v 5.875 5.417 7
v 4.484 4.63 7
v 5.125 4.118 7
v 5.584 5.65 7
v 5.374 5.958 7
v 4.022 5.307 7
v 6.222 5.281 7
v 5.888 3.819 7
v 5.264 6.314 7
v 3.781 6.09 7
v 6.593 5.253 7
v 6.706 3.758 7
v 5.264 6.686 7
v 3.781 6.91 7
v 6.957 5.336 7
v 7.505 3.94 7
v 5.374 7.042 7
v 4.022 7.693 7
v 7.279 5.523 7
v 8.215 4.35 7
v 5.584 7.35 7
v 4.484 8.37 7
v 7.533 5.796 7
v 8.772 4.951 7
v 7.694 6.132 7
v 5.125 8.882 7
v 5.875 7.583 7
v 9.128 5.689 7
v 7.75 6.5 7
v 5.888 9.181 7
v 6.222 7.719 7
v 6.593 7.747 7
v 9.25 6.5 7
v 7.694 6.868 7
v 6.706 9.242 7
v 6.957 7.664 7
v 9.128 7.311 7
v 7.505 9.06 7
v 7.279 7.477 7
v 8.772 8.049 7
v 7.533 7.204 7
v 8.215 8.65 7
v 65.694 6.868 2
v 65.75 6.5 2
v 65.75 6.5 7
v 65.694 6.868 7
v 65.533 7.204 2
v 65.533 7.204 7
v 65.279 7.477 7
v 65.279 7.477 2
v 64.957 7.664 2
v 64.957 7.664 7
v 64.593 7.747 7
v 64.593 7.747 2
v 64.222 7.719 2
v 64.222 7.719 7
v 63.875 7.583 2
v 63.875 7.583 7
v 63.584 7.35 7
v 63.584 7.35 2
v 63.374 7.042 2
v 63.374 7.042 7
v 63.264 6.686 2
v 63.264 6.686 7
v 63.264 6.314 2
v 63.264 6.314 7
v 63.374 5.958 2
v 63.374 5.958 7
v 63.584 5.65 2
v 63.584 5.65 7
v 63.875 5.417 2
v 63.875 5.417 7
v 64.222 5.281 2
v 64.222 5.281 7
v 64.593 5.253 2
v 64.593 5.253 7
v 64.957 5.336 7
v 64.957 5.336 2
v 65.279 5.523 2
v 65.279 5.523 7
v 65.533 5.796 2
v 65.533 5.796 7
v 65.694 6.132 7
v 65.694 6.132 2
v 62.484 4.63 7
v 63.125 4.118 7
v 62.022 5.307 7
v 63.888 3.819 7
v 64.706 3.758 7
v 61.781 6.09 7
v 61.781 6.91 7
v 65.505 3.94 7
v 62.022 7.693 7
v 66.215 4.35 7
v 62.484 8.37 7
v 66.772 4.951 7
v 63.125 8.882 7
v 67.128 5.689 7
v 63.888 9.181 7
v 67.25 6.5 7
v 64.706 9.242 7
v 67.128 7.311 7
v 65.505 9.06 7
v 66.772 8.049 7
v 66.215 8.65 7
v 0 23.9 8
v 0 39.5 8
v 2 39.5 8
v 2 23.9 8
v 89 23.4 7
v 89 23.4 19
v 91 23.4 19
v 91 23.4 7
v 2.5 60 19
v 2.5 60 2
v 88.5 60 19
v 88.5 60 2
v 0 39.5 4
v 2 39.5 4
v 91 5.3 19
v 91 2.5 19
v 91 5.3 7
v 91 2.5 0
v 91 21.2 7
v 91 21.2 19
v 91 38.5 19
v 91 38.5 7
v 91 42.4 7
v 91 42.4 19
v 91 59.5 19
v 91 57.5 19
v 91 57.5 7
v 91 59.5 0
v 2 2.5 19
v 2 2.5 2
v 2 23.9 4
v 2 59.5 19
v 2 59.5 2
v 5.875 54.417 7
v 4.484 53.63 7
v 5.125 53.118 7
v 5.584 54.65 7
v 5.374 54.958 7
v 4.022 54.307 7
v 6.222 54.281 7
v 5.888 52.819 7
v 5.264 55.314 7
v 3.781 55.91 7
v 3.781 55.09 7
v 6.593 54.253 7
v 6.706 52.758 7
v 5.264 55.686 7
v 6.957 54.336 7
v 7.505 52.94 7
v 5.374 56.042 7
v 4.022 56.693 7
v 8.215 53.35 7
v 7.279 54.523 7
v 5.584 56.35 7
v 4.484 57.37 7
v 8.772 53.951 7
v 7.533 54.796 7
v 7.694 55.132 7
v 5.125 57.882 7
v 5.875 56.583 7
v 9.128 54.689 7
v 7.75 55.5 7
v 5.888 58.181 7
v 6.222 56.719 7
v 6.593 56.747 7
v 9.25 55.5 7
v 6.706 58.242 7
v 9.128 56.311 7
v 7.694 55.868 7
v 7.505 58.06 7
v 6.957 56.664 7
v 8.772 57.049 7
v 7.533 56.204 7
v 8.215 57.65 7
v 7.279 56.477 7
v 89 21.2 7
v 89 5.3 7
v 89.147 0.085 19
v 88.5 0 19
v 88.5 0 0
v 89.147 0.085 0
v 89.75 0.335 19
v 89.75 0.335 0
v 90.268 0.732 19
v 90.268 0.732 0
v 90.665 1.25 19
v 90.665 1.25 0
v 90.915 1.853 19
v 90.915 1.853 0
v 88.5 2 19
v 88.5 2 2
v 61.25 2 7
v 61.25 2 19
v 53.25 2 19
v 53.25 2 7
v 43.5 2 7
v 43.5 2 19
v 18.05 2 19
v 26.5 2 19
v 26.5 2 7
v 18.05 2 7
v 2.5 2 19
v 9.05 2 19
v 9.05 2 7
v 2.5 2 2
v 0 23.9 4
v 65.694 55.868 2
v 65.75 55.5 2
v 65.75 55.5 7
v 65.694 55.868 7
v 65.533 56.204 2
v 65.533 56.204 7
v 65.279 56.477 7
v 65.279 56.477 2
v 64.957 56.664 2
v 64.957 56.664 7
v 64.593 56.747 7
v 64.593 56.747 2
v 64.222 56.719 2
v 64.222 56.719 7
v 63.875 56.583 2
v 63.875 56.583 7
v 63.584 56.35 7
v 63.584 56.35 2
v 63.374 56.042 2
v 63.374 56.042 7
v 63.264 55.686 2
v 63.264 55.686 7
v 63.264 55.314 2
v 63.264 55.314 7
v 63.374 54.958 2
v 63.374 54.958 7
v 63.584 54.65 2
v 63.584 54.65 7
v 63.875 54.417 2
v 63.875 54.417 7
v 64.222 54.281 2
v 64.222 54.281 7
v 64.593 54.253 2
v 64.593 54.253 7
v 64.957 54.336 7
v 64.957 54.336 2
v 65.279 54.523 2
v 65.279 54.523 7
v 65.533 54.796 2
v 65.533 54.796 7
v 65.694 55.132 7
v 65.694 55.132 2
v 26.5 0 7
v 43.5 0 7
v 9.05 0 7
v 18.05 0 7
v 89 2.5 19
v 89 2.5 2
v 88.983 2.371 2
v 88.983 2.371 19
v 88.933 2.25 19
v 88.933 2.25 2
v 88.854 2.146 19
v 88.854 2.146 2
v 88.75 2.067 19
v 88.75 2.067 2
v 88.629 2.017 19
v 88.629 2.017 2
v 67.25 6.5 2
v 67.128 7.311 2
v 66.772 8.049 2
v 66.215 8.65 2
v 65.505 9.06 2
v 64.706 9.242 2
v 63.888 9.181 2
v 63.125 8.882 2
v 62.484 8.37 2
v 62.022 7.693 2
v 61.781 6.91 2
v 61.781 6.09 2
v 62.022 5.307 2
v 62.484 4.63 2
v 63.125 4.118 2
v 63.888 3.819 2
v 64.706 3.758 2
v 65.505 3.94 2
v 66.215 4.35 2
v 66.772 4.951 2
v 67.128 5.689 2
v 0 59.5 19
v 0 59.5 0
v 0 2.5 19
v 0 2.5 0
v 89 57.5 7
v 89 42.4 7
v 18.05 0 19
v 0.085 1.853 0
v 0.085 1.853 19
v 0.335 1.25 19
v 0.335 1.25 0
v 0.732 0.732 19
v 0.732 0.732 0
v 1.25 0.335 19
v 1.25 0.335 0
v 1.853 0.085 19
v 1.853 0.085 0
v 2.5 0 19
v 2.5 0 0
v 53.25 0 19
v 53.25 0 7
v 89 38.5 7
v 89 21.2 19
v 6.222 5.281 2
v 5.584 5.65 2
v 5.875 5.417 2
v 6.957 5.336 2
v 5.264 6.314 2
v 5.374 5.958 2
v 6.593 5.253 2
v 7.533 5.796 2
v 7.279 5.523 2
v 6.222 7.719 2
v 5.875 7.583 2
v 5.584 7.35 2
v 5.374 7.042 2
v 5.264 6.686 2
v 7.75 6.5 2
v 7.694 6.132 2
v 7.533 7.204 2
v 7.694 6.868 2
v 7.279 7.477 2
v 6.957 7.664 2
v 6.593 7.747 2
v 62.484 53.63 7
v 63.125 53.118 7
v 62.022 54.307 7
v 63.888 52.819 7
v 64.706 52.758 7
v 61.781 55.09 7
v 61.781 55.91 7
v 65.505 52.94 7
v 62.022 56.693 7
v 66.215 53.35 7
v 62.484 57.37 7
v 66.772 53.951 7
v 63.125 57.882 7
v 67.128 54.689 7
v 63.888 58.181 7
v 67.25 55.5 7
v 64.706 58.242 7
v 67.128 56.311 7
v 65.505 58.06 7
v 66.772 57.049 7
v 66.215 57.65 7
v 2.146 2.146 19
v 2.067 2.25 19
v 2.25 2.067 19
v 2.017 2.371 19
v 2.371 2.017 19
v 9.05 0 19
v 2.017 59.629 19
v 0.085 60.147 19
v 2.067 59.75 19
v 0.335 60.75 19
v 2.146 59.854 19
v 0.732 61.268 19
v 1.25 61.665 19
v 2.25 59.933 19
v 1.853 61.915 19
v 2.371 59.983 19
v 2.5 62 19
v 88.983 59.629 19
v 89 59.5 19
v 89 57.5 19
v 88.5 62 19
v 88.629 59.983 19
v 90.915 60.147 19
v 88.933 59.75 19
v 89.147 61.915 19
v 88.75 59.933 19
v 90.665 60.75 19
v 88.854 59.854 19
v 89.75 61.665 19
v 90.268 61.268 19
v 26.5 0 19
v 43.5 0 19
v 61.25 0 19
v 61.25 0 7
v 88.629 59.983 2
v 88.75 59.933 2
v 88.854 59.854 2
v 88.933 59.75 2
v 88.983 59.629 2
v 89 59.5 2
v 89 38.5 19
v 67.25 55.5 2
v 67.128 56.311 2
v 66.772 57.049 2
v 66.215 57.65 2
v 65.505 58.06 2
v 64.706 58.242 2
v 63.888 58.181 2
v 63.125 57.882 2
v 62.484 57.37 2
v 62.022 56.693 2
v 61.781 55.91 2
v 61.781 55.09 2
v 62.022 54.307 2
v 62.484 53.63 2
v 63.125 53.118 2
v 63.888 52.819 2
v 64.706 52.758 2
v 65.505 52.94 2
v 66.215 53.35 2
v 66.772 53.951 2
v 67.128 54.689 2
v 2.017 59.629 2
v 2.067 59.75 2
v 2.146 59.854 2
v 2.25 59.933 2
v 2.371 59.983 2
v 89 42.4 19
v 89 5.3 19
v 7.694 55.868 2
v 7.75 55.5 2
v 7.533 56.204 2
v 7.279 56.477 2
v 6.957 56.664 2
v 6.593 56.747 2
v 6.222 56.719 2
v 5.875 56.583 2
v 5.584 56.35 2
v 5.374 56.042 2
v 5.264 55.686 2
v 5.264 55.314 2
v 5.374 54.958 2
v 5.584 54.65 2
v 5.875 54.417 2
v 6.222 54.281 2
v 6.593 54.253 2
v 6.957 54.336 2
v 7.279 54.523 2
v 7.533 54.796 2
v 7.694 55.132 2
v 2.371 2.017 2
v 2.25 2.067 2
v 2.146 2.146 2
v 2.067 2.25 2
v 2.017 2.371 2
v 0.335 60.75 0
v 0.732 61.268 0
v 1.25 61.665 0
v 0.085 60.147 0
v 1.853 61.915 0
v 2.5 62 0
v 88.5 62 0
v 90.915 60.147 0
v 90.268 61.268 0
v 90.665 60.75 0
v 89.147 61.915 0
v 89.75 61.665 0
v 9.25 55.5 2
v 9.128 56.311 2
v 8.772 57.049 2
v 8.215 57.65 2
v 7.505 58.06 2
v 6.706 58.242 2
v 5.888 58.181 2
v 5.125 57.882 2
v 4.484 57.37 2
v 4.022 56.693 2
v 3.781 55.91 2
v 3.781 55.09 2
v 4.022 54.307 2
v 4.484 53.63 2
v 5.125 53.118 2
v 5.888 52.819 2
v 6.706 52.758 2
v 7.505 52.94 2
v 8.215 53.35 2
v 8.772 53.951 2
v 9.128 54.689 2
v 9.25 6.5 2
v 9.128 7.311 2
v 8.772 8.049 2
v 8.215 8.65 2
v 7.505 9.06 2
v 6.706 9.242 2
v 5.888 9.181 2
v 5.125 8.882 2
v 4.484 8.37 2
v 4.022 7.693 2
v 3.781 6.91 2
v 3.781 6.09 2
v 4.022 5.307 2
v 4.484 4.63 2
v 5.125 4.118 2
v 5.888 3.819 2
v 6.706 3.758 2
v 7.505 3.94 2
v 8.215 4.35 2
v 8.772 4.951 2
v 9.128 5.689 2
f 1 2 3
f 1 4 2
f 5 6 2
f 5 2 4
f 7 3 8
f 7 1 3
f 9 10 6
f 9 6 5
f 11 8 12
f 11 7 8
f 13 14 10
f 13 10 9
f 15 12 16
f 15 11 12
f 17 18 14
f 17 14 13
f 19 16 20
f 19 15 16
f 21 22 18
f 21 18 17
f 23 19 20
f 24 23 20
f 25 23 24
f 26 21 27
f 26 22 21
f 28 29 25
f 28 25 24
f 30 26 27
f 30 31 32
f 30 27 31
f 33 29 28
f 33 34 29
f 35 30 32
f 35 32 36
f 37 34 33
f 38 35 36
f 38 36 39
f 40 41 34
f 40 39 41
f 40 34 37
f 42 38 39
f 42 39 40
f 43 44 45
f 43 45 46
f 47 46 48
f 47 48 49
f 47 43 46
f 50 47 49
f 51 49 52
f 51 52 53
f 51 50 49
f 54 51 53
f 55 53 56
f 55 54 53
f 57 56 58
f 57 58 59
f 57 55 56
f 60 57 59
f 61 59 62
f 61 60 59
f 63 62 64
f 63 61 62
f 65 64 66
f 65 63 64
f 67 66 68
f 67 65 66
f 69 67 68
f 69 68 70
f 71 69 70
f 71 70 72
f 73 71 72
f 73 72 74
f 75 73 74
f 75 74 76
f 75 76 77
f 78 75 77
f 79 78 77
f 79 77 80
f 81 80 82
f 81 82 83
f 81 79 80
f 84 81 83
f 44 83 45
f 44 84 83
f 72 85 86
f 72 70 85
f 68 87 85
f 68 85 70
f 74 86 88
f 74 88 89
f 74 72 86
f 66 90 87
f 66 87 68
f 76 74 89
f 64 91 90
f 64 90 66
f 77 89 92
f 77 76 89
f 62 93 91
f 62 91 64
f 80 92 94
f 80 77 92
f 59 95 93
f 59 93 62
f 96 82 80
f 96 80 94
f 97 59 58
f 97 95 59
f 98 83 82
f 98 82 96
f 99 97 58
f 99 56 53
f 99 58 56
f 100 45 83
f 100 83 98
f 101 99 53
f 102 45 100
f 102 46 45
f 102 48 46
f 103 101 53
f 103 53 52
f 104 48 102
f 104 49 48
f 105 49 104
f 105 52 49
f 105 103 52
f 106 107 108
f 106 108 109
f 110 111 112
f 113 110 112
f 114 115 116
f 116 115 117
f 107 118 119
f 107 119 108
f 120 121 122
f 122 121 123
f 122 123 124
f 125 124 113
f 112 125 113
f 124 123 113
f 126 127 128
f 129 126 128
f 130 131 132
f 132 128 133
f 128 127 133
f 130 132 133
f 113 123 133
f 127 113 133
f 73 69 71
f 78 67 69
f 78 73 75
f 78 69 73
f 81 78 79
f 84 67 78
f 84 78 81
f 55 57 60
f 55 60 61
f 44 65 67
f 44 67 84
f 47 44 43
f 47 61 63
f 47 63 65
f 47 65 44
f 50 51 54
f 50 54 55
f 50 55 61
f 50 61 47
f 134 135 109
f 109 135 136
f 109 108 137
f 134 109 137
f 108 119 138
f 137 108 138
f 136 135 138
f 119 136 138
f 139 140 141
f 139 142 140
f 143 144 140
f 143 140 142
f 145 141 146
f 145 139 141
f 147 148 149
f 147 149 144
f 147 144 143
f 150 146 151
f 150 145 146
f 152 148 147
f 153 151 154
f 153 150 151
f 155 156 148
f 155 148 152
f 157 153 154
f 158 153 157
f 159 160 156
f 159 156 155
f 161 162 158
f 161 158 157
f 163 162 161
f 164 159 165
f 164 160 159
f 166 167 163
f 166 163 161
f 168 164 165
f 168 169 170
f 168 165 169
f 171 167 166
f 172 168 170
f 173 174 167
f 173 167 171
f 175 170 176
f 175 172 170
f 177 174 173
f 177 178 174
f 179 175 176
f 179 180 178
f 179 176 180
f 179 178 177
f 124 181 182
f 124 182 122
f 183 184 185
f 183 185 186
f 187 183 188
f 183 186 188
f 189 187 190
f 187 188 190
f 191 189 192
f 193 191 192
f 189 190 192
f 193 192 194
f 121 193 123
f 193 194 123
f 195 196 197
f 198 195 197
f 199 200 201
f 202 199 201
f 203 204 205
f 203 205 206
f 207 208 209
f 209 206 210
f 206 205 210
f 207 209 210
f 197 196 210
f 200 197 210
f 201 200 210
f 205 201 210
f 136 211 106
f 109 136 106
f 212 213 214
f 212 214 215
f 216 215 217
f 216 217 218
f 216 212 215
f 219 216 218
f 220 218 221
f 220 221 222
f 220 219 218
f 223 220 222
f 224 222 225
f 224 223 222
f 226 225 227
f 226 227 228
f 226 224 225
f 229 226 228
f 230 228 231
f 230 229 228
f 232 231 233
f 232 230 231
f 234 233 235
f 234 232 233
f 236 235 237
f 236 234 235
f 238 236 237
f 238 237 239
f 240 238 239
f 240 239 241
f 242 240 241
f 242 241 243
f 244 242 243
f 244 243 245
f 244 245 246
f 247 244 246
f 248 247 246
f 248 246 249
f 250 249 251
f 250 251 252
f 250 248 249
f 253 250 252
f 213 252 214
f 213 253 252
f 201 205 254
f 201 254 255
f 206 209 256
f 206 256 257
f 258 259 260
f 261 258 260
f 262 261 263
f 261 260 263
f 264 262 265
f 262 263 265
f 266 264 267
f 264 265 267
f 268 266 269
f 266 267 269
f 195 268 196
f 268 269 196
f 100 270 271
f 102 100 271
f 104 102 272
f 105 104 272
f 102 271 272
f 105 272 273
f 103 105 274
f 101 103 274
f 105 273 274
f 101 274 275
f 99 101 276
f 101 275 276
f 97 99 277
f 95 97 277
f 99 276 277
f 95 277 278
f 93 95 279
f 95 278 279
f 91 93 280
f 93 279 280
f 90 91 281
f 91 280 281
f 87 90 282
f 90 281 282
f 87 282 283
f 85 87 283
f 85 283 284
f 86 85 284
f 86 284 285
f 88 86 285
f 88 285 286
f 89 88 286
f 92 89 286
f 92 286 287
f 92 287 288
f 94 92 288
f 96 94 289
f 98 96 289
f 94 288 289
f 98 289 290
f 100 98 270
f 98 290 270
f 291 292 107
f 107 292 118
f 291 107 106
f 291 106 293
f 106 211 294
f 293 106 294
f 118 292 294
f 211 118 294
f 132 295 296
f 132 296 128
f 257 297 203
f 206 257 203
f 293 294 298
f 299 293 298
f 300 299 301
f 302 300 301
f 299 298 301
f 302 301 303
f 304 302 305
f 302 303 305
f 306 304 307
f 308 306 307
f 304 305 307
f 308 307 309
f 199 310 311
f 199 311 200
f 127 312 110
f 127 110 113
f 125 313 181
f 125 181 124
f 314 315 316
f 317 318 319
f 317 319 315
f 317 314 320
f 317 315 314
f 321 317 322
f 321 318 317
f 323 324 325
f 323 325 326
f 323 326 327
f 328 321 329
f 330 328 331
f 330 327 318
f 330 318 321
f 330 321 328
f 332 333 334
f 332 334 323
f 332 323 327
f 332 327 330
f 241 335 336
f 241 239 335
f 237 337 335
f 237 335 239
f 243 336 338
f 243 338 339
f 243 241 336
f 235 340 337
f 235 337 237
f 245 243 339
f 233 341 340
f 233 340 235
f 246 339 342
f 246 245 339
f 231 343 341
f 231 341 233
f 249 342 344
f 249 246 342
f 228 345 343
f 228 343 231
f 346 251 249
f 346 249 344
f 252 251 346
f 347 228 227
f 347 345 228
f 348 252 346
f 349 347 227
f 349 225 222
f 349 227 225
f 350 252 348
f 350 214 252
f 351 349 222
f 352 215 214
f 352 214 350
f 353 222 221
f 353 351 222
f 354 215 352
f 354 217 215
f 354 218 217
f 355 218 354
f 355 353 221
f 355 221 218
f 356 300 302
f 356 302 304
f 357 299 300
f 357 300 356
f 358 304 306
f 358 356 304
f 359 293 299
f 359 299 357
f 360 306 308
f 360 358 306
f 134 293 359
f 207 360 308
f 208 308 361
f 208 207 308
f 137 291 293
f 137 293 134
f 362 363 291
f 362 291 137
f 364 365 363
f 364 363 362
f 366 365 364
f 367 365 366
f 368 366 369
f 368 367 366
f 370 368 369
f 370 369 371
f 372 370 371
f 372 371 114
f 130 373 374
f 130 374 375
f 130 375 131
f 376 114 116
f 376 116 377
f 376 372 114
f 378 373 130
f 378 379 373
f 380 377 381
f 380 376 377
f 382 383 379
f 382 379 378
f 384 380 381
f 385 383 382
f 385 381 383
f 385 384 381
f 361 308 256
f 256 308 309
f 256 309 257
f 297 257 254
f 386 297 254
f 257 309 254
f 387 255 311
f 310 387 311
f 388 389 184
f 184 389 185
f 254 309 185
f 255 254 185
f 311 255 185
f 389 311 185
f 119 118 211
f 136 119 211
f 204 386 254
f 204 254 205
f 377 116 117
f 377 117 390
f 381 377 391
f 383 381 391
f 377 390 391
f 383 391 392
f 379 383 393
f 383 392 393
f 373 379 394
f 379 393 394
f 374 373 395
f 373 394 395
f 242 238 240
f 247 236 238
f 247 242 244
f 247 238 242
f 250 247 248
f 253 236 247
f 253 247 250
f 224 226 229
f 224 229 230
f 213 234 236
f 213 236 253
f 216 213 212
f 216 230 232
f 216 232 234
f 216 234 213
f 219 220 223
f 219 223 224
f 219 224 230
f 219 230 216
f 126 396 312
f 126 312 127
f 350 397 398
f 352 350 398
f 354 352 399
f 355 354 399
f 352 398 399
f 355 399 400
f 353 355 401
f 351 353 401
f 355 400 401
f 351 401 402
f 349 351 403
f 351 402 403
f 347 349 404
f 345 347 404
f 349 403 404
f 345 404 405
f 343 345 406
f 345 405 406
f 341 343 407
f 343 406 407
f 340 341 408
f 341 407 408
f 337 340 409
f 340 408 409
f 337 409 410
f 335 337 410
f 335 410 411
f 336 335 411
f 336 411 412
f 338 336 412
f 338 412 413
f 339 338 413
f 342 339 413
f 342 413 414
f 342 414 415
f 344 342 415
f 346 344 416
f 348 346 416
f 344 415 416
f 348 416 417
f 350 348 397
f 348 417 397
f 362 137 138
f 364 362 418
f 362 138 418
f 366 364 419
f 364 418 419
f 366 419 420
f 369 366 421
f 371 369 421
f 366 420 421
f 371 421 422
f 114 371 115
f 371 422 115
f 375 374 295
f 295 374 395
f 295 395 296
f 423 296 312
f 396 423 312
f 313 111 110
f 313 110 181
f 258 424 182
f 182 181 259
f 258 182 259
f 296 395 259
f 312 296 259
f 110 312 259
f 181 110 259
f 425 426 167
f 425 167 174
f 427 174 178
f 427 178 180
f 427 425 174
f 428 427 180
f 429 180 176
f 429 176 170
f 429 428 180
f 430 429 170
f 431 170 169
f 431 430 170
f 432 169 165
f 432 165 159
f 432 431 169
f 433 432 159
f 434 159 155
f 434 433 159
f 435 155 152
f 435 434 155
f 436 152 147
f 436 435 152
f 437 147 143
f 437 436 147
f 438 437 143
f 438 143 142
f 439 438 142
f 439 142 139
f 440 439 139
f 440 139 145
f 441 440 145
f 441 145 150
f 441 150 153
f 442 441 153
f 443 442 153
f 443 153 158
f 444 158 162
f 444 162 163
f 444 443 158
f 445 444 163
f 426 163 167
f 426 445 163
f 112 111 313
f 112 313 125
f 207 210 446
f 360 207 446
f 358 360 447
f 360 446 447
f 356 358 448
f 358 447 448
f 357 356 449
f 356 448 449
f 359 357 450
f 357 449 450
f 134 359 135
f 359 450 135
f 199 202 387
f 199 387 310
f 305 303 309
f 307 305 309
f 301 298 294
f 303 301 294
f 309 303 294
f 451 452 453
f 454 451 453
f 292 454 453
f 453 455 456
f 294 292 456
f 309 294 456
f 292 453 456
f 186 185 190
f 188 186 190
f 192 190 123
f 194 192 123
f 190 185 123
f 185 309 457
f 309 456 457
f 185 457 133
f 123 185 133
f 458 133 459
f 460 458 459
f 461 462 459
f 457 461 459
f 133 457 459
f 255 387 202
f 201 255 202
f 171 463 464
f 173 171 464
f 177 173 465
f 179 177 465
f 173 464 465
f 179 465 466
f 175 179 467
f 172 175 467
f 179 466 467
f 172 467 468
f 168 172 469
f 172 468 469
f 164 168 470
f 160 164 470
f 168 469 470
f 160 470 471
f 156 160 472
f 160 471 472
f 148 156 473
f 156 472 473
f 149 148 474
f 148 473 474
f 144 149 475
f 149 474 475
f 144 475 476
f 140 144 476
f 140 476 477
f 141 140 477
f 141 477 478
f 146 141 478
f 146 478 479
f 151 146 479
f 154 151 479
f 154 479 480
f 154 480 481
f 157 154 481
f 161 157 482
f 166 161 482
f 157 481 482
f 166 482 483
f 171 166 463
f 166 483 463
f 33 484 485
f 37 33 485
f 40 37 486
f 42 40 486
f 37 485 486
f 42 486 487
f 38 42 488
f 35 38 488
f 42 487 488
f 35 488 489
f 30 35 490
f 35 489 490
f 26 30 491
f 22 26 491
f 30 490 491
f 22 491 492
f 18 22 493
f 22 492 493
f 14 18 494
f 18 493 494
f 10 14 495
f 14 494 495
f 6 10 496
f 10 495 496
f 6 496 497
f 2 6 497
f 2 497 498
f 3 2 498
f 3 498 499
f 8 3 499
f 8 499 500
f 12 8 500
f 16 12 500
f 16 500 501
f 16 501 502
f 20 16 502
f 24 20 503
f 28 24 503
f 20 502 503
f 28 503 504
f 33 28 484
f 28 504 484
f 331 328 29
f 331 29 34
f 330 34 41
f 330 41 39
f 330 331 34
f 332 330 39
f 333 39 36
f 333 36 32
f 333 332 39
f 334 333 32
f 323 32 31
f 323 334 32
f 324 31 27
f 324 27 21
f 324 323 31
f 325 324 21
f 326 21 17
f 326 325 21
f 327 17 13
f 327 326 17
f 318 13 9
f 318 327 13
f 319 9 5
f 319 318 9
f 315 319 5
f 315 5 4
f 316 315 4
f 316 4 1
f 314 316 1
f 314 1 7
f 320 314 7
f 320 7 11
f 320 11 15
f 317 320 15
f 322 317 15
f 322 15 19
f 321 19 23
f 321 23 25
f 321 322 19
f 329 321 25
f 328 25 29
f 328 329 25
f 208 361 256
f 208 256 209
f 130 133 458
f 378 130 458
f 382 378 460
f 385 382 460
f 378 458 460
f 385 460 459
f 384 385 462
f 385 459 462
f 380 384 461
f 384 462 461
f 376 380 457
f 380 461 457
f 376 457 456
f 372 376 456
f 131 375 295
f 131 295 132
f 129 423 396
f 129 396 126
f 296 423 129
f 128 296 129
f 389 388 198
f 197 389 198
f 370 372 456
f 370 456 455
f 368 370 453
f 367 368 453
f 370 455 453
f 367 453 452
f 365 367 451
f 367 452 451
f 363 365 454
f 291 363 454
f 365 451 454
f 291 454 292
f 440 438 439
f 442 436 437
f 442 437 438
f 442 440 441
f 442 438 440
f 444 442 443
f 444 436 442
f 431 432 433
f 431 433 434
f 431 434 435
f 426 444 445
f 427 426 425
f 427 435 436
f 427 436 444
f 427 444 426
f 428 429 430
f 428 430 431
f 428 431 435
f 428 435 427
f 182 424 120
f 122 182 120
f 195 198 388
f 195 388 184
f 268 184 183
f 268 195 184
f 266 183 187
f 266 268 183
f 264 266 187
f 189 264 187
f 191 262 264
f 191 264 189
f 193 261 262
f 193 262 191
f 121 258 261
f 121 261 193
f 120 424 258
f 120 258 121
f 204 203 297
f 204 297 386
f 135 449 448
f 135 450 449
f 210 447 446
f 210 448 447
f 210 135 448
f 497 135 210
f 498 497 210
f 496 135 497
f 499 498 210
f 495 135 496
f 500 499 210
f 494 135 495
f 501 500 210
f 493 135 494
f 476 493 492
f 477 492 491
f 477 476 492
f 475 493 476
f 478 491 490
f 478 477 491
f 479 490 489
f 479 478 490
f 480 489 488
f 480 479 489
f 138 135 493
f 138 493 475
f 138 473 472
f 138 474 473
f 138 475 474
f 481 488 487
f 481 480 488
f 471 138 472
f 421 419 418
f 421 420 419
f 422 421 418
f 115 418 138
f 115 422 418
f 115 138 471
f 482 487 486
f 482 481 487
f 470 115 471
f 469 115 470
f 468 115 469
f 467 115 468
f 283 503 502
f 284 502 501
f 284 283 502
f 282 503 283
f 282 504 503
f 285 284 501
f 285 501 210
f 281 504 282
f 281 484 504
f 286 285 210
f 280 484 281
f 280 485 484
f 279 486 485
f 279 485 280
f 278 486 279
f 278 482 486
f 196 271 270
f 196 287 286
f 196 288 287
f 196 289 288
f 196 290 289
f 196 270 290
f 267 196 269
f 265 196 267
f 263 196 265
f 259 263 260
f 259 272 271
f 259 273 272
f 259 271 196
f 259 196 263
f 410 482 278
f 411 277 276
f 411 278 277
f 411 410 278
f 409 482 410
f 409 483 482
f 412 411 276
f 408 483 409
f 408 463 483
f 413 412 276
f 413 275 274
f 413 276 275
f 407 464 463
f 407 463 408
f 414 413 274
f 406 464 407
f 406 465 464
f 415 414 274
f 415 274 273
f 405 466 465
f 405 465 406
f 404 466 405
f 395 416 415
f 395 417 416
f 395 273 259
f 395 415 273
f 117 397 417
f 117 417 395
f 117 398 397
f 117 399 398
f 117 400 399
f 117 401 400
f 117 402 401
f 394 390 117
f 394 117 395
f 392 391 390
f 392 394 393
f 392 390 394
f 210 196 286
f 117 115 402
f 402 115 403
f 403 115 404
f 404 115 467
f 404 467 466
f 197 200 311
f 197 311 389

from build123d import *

# Parameters (mm, degrees)
F1_DEPTH = 2
F2_DEPTH = 19
F3_R     = 2.75
F3_R_2   = 1.25
F4_DEPTH = 5
F5_W     = 9
F5_H     = 2
F5_W_2   = 17
F5_W_3   = 8
F5_W_4   = 2
F5_H_2   = 15.9
F5_H_3   = 15.1
F6_DEPTH = 12
F7_W     = 15.6
F7_H     = 4
F8_DEPTH = 2


with BuildPart() as f1:
    # F0 (on Top) → F1 (new body)
    with BuildSketch(Plane.XY):
        with BuildLine():
            ThreePointArc((0, 2.5), (0.732233047, 0.732233047), (2.5, 0))
            Line((2.5, 0), (88.5, 0))
            ThreePointArc((88.5, 0), (90.267766953, 0.732233047), (91, 2.5))
            Line((91, 2.5), (91, 59.5))
            ThreePointArc((91, 59.5), (90.267766953, 61.267766953), (88.5, 62))
            Line((88.5, 62), (2.5, 62))
            ThreePointArc((2.5, 62), (0.732233047, 61.267766953), (0, 59.5))
            Line((0, 59.5), (0, 2.5))
        make_face()
        with BuildLine():
            ThreePointArc((2, 59.5), (2.1464466094, 59.8535533906), (2.5, 60))
            Line((2.5, 60), (88.5, 60))
            ThreePointArc((88.5, 60), (88.8535533906, 59.8535533906), (89, 59.5))
            Line((89, 59.5), (89, 2.5))
            ThreePointArc((89, 2.5), (88.8535533906, 2.1464466094), (88.5, 2))
            Line((88.5, 2), (2.5, 2))
            ThreePointArc((2.5, 2), (2.1464466094, 2.1464466094), (2, 2.5))
            Line((2, 2.5), (2, 59.5))
        make_face(mode=Mode.SUBTRACT)
        with BuildLine():
            Line((88.5, 60), (2.5, 60))
            ThreePointArc((2.5, 60), (2.1464466094, 59.8535533906), (2, 59.5))
            Line((2, 59.5), (2, 2.5))
            ThreePointArc((2, 2.5), (2.1464466094, 2.1464466094), (2.5, 2))
            Line((2.5, 2), (88.5, 2))
            ThreePointArc((88.5, 2), (88.8535533906, 2.1464466094), (89, 2.5))
            Line((89, 2.5), (89, 59.5))
            ThreePointArc((89, 59.5), (88.8535533906, 59.8535533906), (88.5, 60))
        make_face()
    extrude(amount=F1_DEPTH)

    # F0 (on Top) → F2 (join)
    with BuildSketch(Plane.XY):
        with BuildLine():
            ThreePointArc((0, 2.5), (0.732233047, 0.732233047), (2.5, 0))
            Line((2.5, 0), (88.5, 0))
            ThreePointArc((88.5, 0), (90.267766953, 0.732233047), (91, 2.5))
            Line((91, 2.5), (91, 59.5))
            ThreePointArc((91, 59.5), (90.267766953, 61.267766953), (88.5, 62))
            Line((88.5, 62), (2.5, 62))
            ThreePointArc((2.5, 62), (0.732233047, 61.267766953), (0, 59.5))
            Line((0, 59.5), (0, 2.5))
        make_face()
        with BuildLine():
            ThreePointArc((2, 59.5), (2.1464466094, 59.8535533906), (2.5, 60))
            Line((2.5, 60), (88.5, 60))
            ThreePointArc((88.5, 60), (88.8535533906, 59.8535533906), (89, 59.5))
            Line((89, 59.5), (89, 2.5))
            ThreePointArc((89, 2.5), (88.8535533906, 2.1464466094), (88.5, 2))
            Line((88.5, 2), (2.5, 2))
            ThreePointArc((2.5, 2), (2.1464466094, 2.1464466094), (2, 2.5))
            Line((2, 2.5), (2, 59.5))
        make_face(mode=Mode.SUBTRACT)
    extrude(amount=F2_DEPTH)

    # F3 (on face) → F4 (join)
    with BuildSketch(Plane.XY.offset(2)):
        with Locations((6.5, 55.5)):
            Circle(F3_R)
        with Locations((6.5, 55.5)):
            Circle(F3_R_2, mode=Mode.SUBTRACT)
        with Locations((64.5, 55.5)):
            Circle(F3_R)
        with Locations((64.5, 55.5)):
            Circle(F3_R_2, mode=Mode.SUBTRACT)
        with Locations((6.5, 6.5)):
            Circle(F3_R)
        with Locations((6.5, 6.5)):
            Circle(F3_R_2, mode=Mode.SUBTRACT)
        with Locations((64.5, 6.5)):
            Circle(F3_R)
        with Locations((64.5, 6.5)):
            Circle(F3_R_2, mode=Mode.SUBTRACT)
    extrude(amount=F4_DEPTH)

    # F5 (on face) → F6 (cut)
    with BuildSketch(Plane.XY.offset(19)):
        with Locations((13.55, 1)):
            Rectangle(F5_W, F5_H)
        with Locations((35, 1)):
            Rectangle(F5_W_2, F5_H)
        with Locations((57.25, 1)):
            Rectangle(F5_W_3, F5_H)
        with Locations((90, 13.25)):
            Rectangle(F5_W_4, F5_H_2)
        with Locations((90, 30.95)):
            Rectangle(F5_W_4, F5_H_3)
        with Locations((90, 49.95)):
            Rectangle(F5_W_4, F5_H_3)
    extrude(amount=-F6_DEPTH, mode=Mode.SUBTRACT)

    # F7 (on face) → F8 (cut)
    with BuildSketch(Plane(origin=(0, 0, 0), x_dir=(0, -1, 0), z_dir=(-1, 0, 0))):
        with Locations((-31.7, 6)):
            Rectangle(F7_W, F7_H)
    extrude(amount=-F8_DEPTH, mode=Mode.SUBTRACT)


solid = f1.part
